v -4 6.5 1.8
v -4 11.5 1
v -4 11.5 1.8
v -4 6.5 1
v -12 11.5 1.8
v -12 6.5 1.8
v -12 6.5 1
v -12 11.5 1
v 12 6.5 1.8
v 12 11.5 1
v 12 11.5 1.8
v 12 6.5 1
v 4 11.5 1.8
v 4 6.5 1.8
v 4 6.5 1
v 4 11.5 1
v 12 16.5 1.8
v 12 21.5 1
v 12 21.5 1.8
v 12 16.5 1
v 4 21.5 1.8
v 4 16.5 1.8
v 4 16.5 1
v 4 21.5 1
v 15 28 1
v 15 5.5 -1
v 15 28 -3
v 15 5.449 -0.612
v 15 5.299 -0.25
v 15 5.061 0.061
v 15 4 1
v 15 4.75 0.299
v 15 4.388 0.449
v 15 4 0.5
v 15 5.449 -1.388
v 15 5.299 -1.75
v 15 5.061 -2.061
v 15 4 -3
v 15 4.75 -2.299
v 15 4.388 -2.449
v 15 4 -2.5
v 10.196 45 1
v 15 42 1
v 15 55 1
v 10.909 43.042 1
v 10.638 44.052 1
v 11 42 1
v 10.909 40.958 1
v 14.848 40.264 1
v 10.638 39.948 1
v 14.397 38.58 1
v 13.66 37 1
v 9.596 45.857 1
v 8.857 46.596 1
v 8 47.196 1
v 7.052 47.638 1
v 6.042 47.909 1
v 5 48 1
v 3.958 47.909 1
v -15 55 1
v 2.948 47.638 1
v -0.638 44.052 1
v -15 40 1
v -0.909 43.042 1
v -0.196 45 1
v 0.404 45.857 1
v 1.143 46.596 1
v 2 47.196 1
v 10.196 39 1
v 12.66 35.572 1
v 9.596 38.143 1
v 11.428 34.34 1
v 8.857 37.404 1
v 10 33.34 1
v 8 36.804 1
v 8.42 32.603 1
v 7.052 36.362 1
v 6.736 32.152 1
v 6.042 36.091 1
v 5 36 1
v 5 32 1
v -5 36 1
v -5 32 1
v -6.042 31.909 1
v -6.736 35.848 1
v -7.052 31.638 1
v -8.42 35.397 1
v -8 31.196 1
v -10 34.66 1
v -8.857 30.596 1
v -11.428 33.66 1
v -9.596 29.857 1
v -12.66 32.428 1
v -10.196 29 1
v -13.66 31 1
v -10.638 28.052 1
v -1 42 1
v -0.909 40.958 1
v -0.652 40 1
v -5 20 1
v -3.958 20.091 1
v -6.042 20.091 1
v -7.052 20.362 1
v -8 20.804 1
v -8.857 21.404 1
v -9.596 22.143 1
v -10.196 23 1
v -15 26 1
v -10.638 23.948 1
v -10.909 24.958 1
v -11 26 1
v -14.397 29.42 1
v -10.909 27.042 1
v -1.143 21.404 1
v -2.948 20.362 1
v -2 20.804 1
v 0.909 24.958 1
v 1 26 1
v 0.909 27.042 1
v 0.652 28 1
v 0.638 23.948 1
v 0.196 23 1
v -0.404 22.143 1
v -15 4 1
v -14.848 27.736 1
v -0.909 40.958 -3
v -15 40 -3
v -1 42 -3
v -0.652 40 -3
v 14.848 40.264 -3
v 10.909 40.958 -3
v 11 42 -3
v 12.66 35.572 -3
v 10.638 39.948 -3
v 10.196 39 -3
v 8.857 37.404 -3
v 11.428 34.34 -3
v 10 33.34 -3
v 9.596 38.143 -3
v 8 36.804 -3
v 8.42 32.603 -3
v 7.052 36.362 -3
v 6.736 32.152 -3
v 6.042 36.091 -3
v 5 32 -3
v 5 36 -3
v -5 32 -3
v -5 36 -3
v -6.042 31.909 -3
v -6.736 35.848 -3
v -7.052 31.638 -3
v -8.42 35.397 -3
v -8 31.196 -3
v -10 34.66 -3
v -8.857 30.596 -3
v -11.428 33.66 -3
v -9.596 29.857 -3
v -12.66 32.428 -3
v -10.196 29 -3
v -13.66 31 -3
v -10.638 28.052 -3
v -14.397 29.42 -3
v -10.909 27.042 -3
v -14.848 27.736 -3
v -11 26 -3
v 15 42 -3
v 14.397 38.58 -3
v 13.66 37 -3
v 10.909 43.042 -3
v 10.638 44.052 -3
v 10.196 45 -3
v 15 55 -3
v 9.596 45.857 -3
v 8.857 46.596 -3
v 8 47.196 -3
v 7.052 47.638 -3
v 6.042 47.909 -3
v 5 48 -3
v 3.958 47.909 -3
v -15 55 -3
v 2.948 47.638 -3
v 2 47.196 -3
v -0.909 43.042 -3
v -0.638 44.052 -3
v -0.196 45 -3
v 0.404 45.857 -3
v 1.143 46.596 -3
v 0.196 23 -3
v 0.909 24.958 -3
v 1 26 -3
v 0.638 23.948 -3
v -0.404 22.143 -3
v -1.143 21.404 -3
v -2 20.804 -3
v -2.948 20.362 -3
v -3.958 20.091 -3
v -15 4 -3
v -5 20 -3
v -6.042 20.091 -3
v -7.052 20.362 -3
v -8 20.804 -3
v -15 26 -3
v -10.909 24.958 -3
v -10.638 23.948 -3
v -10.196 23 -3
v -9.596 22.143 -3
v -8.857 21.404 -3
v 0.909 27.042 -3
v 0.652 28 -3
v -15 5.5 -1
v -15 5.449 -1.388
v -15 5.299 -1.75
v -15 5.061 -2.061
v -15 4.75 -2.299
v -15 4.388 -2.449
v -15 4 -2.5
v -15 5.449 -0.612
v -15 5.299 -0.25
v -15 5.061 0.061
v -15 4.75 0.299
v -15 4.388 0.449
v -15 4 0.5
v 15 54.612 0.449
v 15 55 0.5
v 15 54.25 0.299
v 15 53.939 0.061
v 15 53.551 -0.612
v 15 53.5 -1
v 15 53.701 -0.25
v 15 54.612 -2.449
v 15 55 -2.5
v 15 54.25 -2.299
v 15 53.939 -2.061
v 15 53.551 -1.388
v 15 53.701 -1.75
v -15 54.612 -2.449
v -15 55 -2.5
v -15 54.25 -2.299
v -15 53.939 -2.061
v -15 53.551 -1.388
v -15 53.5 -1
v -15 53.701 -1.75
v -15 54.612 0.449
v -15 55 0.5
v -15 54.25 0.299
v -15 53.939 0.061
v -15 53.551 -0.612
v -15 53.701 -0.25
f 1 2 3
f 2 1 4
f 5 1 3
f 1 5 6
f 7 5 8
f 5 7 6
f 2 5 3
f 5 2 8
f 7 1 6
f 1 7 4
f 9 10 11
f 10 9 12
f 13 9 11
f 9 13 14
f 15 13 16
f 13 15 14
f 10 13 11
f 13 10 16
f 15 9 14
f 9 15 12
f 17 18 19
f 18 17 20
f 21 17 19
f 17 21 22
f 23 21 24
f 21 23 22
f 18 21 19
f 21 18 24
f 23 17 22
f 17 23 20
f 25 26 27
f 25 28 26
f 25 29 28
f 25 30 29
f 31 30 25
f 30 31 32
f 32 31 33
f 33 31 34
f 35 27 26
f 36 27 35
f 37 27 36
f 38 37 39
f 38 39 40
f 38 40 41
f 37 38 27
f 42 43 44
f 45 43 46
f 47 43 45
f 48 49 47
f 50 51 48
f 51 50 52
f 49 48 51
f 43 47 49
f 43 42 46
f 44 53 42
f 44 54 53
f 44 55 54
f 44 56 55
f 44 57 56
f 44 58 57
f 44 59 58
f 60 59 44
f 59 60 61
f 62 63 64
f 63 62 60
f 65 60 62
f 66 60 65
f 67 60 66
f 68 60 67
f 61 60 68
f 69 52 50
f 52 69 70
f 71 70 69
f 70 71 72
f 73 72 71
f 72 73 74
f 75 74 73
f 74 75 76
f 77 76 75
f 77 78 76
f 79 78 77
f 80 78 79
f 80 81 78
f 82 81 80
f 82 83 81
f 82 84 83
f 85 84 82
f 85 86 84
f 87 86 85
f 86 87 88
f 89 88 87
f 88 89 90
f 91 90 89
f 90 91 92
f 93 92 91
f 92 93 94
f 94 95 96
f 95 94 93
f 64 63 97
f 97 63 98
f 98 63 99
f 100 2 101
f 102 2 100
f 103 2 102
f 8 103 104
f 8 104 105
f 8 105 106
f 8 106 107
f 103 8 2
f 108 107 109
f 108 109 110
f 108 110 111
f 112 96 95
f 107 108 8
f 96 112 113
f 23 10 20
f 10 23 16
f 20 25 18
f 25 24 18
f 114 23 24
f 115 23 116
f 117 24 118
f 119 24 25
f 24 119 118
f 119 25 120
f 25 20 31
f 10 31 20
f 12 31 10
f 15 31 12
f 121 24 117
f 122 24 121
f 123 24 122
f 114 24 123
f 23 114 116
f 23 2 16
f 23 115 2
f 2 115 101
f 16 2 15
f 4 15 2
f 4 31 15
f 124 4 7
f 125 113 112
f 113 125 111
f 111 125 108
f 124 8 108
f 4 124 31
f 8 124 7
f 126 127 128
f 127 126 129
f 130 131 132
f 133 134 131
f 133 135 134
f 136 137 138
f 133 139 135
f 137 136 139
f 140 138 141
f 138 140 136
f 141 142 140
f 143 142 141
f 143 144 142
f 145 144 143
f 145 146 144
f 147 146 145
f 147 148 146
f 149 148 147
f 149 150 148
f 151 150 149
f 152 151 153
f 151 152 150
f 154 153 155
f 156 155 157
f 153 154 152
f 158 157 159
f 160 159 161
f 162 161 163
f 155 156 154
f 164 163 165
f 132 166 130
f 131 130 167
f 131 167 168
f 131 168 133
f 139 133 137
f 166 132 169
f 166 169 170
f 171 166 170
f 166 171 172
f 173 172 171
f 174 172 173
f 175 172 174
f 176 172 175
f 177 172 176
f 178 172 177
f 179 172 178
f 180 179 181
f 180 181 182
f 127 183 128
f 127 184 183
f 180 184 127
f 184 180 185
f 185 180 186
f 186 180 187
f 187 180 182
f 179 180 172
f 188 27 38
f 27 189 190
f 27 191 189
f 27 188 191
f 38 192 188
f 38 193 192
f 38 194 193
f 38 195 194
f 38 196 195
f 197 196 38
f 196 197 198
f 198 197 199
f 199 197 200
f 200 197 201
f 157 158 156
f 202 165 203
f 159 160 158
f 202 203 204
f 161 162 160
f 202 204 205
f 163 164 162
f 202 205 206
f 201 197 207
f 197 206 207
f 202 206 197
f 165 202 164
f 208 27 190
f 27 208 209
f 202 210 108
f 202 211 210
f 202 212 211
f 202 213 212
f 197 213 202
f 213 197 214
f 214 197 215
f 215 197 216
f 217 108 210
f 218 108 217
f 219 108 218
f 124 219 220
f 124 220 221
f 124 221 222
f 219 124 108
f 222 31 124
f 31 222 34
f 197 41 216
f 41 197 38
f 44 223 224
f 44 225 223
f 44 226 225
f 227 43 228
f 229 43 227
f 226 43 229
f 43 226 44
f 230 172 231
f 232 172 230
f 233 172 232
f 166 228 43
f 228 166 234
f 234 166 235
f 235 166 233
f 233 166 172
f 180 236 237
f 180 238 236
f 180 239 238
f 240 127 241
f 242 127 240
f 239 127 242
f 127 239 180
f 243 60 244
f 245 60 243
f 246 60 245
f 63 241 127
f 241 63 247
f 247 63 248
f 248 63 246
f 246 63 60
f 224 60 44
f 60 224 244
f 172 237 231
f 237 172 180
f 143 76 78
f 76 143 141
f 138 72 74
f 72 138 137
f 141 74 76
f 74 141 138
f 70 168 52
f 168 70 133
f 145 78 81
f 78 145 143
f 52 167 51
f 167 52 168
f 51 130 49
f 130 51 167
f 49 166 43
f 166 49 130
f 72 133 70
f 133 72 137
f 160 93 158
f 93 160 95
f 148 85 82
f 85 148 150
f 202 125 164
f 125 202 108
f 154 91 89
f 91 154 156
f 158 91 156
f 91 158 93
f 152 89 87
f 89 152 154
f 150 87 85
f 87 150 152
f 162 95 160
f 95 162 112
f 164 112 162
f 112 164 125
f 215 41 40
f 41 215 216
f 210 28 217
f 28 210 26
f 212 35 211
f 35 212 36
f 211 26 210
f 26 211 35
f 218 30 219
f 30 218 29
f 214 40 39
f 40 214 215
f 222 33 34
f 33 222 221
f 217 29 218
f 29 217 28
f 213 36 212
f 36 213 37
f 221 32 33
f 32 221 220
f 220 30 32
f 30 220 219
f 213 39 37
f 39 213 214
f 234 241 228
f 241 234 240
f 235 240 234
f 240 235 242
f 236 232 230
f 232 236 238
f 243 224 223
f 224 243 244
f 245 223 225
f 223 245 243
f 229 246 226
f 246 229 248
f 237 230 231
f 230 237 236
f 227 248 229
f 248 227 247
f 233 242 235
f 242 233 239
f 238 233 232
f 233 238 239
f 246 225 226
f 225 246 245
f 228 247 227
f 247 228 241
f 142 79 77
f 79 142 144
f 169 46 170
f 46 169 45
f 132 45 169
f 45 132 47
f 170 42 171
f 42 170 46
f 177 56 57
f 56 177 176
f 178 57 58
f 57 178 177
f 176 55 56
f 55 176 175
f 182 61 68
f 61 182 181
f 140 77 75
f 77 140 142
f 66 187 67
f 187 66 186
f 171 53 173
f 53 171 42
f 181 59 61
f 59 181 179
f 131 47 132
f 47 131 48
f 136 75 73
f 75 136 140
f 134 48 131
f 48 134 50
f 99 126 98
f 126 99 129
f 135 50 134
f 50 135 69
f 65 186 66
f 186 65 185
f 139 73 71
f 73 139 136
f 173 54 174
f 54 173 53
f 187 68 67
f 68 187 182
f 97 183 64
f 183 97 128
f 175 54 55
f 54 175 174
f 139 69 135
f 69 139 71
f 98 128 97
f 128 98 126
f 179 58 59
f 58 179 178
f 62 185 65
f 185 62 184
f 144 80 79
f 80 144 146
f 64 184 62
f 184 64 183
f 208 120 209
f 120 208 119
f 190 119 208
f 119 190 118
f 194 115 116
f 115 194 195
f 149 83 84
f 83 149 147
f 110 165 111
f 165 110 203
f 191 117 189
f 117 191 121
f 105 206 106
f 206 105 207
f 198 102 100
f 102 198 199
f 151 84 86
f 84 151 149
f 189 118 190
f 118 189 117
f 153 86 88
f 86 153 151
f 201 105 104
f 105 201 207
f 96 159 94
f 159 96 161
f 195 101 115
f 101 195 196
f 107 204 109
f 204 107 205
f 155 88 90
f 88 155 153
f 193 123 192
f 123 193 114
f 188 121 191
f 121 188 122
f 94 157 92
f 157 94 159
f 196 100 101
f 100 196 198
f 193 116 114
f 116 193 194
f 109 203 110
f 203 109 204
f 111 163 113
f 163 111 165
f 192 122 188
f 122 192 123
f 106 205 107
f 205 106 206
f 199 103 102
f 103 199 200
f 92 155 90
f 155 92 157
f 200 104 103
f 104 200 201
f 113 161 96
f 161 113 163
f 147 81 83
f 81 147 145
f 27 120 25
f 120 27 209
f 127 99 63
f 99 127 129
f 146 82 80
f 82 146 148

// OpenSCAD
FFF=[false,false,false];FFT=[false,false,true];
FTF=[false,true,false];FTT=[false,true,true];
TFF=[true,false,false];TFT=[true,false,true];
TTF=[true,true,false];TTT=[true,true,true];
module cube2(size, center) {
  translate([
    center[0] ? -size[0]/2 : 0,
    center[1] ? -size[1]/2 : 0,
    center[2] ? -size[2]/2 : 0]) cube(size);
}
module with_mirror_x() {
  for(a=[0,1])mirror([a,0])children();
}
module with_mirror_y() {
  for(a=[0,1])mirror([0,a])children();
}

module remote_jowisza_v1() {
  {
    hull() {
      with_mirror_x(){
        translate([15,3]) cylinder(d=6,h=15.2,$fn=24);
        translate([10,37]) cylinder(d=20,h=15.5,$fn=24);
        translate([15,64]) cylinder(d=8,h=13,$fn=24);
      }
      translate([0,54.5])cylinder(d=30,h=13,$fn=36);
      
    }
    translate([0,2,4])cylinder(d=12,h=6,$fn=24);
  }
}
module remote_jowisza_v2(hook=true) {
  dd=6;
  color("grey") {
    minkowski() {
      translate([0,0,dd/2])hull() {
        with_mirror_x(){
          translate([14,4]) cylinder(d=8-dd,h=15.2-dd,$fn=24);
          translate([0,30]) cylinder(d=20,h=15.5-dd,$fn=24);
          translate([10,37]) cylinder(d=20.2-dd,h=15.2-dd,$fn=24);
          translate([10,25]) cylinder(d=20.2-dd,h=15.2-dd,$fn=24);
          translate([15,64]) cylinder(d=8-dd,h=13-dd,$fn=24);
        }
        translate([0,54.5])cylinder(d=30-dd,h=13-dd,$fn=36);
        
      }
      sphere(d=dd,$fn=24);
    }
    if (hook) {
      translate([0,1,5])cylinder(d=14,h=6,$fn=24);
    }
  }
}
//%translate([0,2,2]) remote_v1();
//translate([0,2,2]) remote_v2();
module bracket_jowisza_v1() {
  difference() {
    union() {
      cube2([42,50,19],TFF);
      
      translate([0,25])with_mirror_y() {
        translate([0,20.5]) rotate([10,0])translate([0,0,-6])cube2([42,2,10],TFF);
      }
    }
    translate([0,2,2]) remote_jowisza_v1();
    translate([0,57,5])cylinder(d=42,h=20,$fn=36);
  }
}

module bracket_jowisza_v2() {
  difference() {
    union() {
      minkowski() {
        translate([0,2,2]) remote_jowisza_v2(false);
        sphere(d=2,$fn=36);
      }
      translate([0,4])for(xy=[[-8,7],[8,7],[8,17]])translate(xy)cube2([8,5,6],TTT);
    }
    translate([0,2,2]) remote_jowisza_v2();
    translate([0,57,0])rotate([45,0])cube2([100,100,100],TFT);
    //translate([0,57,5])cylinder(d=42,h=20,$fn=36);
  }
}
module remote_nice_v1() {
  translate([0,25,7.5]) hull(){
    for(a=[-0.5,0.5])translate([0,0,a])scale([1,1,14/48])sphere(d=48,$fn=60);
  }
}
module bracket_nice_v1() {
  difference() {
    union() {
      minkowski() {
        translate([0,2,2]) remote_nice_v1();
        sphere(d=2,$fn=36);
      }
      
      // backplate
      translate([0,26,1])intersection() {
        cylinder(d=42.5,h=5,$fn=60);
        cube2([30,38,10],TTT);
      }
      // joints
      translate([0,4,1])for(xy=[[-8,7],[8,7],[8,17]])translate(xy)cube2([8,5,8],TTT);
   
    }
    translate([0,2,2]) remote_nice_v1();
    //translate([0,57,0])rotate([45,0])cube2([100,100,100],TFT);
    translate([0,34,7])cube2([100,100,100],TFF);
    translate([0,10,7])rotate([0,0,45])cube2([50,50,50],FFF);
   
    translate([0,27,7])cylinder(d=40,h=20,$fn=60);
    //cube2([100,100,100],TFT);
    //translate([0,57,5])cylinder(d=42,h=20,$fn=36);
  }
}
module bracket_nice_v2() {
  dy=4;
  difference() {
    union() {
      translate([0,dy,2]) intersection() {
        minkowski() {
          remote_nice_v1();
          sphere(d=2,$fn=36);
        }
        translate([0,25,-50+16.9]) sphere(r=50,$fn=60);
        translate([0,25,-100+14.4]) sphere(r=100,$fn=60);
      }
      
      // backplate
      translate([0,29,1])hull() {
        for(x=[-11,11])for(y=[-22,22])translate([x,y])
          cylinder(r=5,h=4,$fn=60);
      }
   
    }
    // joints
    translate([0,4,1])for(xy=[[-8,5],[8,5],[8,15]])translate(xy)cube2([8,5,2],TTT);


    translate([0,dy,2]) remote_nice_v1();
    translate([0,dy+32,7])cube2([100,100,100],TFF);
    translate([0,dy+8,7])rotate([0,0,45])cube2([50,50,50],FFF);
   
    translate([0,dy+25,7])cylinder(d=40,h=20,$fn=60);
  }
}

module hook() {
  h=4;
  width=30;
  length=51;
  spring_id=12;
  spring_width=4;
  top_offset=spring_id+1;
  spring_od=spring_id+spring_width*2;
  hole1_y=length-top_offset;
  hole1_x=width/2-spring_od/2;
  hole2_y=length-top_offset-spring_id-spring_width;
  hole2_x=-width/2+spring_od/2;
  translate([0,4,-3]) difference() {
    union() {
      cube2([width,hole2_y,h],TFF);
      cube2([width/2,hole2_y+4,h],FFF);
      translate([0,hole1_y])cube2([width,top_offset,h],TFF);
      translate([-width/2,hole1_y-4])cube2([width/2,5,h],FFF);
      translate([hole1_x,hole1_y]) cylinder(d=spring_od,h=h,$fn=36);
      translate([hole2_x,hole2_y]) cylinder(d=spring_od,h=h,$fn=36);
      translate([0,(hole1_y+hole2_y)/2])cube2([10,7,h],TTF);
    }
    translate([hole1_x,hole1_y]) cylinder(d=spring_id,h=h*3,$fn=36,center=true);
    translate([hole2_x,hole2_y]) cylinder(d=spring_id,h=h*3,$fn=36,center=true);
    translate([hole2_x,hole2_y+spring_id/2-4])cube2([width,4,h*3],FFT);
    translate([-width,hole1_y-spring_id/2])cube2([width+hole1_x,4,h*3],FFT);
    for(a=[0,length])translate([0,a,h/2])rotate([0,90])cylinder(d=3,h=100,center=true,$fn=24);
    for(xy=[[-8,7],[8,7],[8,17]])translate(xy)cube2([8,5,20],TTT);
  }
}

module hook_v2() {
  h=4;
  width=30;
  length=51;
  spring_id=12;
  spring_width=4;
  top_offset=spring_id+1;
  spring_od=spring_id+spring_width*2;
  hole1_y=length-top_offset;
  hole1_x=width/2-spring_od/2;
  hole2_y=length-top_offset-spring_id-spring_width;
  hole2_x=-width/2+spring_od/2;
  translate([0,4,-3]) difference() {
    union() {
      cube2([width,hole2_y,h],TFF);
      cube2([width/2,hole2_y+4,h],FFF);
      translate([0,hole1_y])cube2([width,top_offset,h],TFF);
      translate([-width/2,hole1_y-4])cube2([width/2,5,h],FFF);
      translate([hole1_x,hole1_y]) cylinder(d=spring_od,h=h,$fn=36);
      translate([hole2_x,hole2_y]) cylinder(d=spring_od,h=h,$fn=36);
      translate([0,(hole1_y+hole2_y)/2])cube2([10,7,h],TTF);

      //joints
      translate([0,0,h])for(xy=[[-8,5],[8,5],[8,15]])translate(xy)cube2([8,5,1.6],TTT);
    }
    translate([hole1_x,hole1_y]) cylinder(d=spring_id,h=h*3,$fn=36,center=true);
    translate([hole2_x,hole2_y]) cylinder(d=spring_id,h=h*3,$fn=36,center=true);
    translate([hole2_x,hole2_y+spring_id/2-4])cube2([width,4,h*3],FFT);
    translate([-width,hole1_y-spring_id/2])cube2([width+hole1_x,4,h*3],FFT);
    for(a=[0,length])translate([0,a,h/2])rotate([0,90])cylinder(d=3,h=100,center=true,$fn=24);
  }
}
//bracket_jowisza_v1();
//bracket_jowisza_v2();
//remote_nice_v1();
//hook();

//bracket_nice_v2();
hook_v2();
